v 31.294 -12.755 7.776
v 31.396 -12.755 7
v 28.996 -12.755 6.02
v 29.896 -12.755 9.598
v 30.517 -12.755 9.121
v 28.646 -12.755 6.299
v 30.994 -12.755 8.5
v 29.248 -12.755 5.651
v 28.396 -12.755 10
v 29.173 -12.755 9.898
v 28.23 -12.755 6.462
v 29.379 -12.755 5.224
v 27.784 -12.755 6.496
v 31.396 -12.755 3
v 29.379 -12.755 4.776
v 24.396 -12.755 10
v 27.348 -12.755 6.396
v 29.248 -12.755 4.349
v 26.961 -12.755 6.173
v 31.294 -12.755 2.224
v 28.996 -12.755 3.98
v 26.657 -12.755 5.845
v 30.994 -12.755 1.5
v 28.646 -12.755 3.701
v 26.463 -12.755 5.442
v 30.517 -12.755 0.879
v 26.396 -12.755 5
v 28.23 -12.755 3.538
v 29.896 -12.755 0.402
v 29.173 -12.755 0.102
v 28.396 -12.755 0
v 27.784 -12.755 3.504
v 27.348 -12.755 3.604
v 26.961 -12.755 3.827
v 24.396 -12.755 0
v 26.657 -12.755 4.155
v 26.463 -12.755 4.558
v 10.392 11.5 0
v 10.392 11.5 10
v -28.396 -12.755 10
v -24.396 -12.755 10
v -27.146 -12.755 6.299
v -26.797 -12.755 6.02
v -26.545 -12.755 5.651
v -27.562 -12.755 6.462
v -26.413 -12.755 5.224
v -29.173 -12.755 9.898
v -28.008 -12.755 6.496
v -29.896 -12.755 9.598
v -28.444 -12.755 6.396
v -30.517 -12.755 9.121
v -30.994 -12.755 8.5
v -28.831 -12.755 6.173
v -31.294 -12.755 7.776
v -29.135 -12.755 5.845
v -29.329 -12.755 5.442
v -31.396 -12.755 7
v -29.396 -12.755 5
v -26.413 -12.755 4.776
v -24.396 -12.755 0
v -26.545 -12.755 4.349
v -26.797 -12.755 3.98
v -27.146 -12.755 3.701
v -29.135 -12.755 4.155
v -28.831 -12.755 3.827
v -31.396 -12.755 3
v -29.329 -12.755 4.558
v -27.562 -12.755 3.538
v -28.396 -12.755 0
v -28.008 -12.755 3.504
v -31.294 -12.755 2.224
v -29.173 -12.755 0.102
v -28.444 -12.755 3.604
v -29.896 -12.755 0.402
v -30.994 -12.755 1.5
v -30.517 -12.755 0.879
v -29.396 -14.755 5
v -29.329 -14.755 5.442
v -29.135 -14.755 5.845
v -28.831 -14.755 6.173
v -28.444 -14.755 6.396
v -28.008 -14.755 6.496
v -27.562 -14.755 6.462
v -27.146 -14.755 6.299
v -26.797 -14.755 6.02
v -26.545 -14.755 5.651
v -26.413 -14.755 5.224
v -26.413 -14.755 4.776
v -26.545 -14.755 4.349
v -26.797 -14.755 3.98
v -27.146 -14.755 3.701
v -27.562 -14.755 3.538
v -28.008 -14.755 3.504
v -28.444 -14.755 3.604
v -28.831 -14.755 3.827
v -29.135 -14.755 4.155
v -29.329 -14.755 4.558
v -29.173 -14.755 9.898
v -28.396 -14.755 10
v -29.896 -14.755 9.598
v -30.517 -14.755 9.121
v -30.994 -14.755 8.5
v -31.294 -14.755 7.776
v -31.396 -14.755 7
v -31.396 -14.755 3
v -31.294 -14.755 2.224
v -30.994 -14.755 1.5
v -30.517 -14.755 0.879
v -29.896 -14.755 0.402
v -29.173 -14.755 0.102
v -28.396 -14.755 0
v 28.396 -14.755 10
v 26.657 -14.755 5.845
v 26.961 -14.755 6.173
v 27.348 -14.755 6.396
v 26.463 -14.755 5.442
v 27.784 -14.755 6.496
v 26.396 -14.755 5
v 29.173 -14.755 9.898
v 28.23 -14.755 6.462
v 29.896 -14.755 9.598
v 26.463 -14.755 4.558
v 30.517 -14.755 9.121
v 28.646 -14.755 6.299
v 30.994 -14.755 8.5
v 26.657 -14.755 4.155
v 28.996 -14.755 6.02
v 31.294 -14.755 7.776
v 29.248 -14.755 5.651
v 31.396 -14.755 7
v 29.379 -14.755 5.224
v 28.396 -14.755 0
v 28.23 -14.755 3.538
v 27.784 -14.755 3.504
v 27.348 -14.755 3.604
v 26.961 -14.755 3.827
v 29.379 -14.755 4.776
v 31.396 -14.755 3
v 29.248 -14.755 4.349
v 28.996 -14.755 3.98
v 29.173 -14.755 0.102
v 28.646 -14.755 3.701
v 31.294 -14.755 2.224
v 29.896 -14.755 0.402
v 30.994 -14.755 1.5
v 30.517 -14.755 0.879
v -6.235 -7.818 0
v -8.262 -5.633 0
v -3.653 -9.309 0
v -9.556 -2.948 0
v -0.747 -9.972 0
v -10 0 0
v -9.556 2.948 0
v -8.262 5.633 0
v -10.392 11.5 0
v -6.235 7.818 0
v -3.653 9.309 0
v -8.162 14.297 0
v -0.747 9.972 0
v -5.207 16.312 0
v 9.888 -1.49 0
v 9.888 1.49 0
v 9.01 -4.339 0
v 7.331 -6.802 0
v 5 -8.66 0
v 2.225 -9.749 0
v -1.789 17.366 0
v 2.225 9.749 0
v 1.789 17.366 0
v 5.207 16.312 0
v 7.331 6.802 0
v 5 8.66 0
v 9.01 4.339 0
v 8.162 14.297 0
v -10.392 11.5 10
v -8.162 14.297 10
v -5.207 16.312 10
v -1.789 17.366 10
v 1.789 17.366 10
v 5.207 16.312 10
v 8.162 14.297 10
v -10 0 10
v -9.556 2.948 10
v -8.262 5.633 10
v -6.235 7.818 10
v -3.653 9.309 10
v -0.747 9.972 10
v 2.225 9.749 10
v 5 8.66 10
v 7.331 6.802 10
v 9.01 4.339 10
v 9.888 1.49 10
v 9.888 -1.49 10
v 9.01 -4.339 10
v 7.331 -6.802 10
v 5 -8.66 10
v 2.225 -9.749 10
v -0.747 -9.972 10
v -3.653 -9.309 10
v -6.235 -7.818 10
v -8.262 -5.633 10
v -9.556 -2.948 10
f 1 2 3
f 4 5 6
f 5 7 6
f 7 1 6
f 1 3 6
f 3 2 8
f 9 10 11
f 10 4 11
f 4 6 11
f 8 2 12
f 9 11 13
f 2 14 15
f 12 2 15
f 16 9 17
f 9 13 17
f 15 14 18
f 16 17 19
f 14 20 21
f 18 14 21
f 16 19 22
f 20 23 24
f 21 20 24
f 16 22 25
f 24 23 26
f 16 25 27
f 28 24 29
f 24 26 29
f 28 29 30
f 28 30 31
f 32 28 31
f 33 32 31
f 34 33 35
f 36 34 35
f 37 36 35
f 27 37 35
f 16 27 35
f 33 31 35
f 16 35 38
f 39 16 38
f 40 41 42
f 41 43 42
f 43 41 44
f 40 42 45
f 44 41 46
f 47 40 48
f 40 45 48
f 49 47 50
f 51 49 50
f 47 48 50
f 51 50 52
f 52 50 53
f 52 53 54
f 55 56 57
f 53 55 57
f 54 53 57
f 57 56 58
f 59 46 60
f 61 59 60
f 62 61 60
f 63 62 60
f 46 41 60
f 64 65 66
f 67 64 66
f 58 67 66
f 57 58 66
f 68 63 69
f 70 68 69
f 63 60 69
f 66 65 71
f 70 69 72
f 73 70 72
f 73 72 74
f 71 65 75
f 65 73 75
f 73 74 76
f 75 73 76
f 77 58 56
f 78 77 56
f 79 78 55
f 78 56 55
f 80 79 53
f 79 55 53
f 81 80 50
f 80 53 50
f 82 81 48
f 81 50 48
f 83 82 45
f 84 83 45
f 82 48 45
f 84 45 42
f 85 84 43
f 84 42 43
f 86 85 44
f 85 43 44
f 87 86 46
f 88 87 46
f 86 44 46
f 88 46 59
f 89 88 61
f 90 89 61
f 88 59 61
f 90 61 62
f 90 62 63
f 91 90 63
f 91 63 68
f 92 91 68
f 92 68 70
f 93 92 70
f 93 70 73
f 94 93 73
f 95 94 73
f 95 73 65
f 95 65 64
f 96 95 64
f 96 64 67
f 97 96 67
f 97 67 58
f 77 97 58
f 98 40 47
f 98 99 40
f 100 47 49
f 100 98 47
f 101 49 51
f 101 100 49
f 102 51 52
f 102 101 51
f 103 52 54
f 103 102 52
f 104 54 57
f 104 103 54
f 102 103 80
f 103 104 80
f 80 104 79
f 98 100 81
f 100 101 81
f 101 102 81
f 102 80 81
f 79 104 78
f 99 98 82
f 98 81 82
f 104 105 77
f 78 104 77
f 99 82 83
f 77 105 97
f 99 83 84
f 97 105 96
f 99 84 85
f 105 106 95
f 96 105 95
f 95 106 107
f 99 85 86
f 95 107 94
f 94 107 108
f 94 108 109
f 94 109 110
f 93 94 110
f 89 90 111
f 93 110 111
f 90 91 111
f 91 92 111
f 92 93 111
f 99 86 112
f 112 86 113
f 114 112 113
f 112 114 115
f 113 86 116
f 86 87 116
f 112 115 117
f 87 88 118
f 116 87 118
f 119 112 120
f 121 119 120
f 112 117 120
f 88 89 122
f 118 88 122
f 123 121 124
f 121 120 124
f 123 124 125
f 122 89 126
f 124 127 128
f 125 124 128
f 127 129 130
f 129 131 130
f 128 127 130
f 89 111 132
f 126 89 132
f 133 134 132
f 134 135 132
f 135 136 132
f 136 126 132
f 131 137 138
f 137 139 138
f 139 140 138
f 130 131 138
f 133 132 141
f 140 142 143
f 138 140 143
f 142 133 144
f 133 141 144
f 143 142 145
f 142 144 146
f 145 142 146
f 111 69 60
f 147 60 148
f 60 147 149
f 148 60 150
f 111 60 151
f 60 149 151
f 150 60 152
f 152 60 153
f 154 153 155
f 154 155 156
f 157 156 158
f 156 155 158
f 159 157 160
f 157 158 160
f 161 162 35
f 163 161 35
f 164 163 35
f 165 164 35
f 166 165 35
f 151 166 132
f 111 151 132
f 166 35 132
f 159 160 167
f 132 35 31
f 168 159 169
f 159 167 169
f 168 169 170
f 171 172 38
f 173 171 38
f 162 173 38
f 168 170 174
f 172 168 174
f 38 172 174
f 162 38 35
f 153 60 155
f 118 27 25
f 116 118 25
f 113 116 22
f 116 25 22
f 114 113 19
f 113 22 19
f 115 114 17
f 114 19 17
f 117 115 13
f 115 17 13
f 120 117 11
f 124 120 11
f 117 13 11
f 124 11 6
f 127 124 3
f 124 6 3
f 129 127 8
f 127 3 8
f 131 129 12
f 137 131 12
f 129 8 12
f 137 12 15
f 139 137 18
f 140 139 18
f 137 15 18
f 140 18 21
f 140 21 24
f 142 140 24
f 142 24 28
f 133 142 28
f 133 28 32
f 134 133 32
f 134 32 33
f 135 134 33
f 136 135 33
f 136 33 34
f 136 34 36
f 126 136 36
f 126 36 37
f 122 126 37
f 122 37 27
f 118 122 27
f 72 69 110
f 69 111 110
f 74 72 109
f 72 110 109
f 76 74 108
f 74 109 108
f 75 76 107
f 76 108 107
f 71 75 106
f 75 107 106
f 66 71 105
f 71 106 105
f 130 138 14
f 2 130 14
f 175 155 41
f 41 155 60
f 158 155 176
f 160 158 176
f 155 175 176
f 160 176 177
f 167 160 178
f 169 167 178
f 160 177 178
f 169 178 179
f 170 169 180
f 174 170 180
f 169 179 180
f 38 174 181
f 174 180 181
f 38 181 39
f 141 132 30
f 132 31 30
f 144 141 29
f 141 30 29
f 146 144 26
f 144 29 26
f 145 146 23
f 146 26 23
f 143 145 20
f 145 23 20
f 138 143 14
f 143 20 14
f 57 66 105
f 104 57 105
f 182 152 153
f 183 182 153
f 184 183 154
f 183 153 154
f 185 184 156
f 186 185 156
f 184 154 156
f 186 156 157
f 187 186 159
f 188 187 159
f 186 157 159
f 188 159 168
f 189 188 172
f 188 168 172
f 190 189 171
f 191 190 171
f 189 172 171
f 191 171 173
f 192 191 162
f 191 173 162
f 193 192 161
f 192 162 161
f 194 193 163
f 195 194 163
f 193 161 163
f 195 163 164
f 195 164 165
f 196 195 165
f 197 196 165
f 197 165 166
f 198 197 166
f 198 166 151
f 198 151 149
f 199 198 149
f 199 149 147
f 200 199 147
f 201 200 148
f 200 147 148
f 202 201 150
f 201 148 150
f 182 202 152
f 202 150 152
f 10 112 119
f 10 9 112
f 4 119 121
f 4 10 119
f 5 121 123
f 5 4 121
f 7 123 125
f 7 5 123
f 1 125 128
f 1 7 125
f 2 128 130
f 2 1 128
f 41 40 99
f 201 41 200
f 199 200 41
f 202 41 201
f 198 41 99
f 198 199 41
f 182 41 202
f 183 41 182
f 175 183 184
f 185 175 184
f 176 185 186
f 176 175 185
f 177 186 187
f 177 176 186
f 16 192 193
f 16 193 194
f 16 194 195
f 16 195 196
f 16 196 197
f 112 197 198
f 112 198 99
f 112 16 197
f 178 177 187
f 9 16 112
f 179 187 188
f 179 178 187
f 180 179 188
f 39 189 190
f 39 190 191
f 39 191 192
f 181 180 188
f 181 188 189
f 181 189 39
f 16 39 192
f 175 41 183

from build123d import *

# Parameters (mm, degrees)
SALIENTE_EXTRUIR3_DEPTH = 10
CROQUIS3_R              = 10
CORTAR_EXTRUIR1_DEPTH   = 10
REDONDEO2_R             = 12
CROQUIS4_R              = 1.5
CORTAR_EXTRUIR2_DEPTH   = 45.733638102
REDONDEO3_R             = 3


with BuildPart() as part:
    # Croquis1 → Saliente-Extruir3 (new body)
    with BuildSketch(Plane.XY):
        Polygon((0, 29.5), (-24.396106146, -12.755295351), (-31.396106146, -12.755295351), (-31.396106146, -14.755295351), (-25.556921229, -14.755295351), (25.556921229, -14.755295351), (31.396106146, -14.755295351), (31.396106146, -12.755295351), (24.396106146, -12.755295351), align=None)
    extrude(amount=SALIENTE_EXTRUIR3_DEPTH)

    # Croquis3 → Cortar-Extruir1 (cut)
    with BuildSketch(Plane(origin=(0, 0, 0), x_dir=(-1, 0, 0), z_dir=(0, 0, -1))):
        Circle(CROQUIS3_R)
    extrude(amount=-CORTAR_EXTRUIR1_DEPTH, mode=Mode.SUBTRACT)

    # Redondeo2
    redondeo2_edges = [part.edges().sort_by_distance(p)[0] for p in [
        (0, 29.5, 5),
    ]]
    fillet(redondeo2_edges, radius=REDONDEO2_R)

    # Croquis4 → Cortar-Extruir2 (cut, through all)
    with BuildSketch(Plane(origin=(0, -12.755295351, 0), x_dir=(1, 0, 0), z_dir=(0, 1, 0))):
        with Locations(Location((27.896106146, -5, 0), (0, 0, 180))):
            Circle(CROQUIS4_R)
        with Locations(Location((-27.896106146, -5, 0), (0, 0, 180))):
            Circle(CROQUIS4_R)
    extrude(amount=-CORTAR_EXTRUIR2_DEPTH, mode=Mode.SUBTRACT)

    # Redondeo3
    redondeo3_edges = [part.edges().sort_by_distance(p)[0] for p in [
        (-31.396106146, -13.755295351, 10),
        (-31.396106146, -13.755295351, 0),
        (31.396106146, -13.755295351, 10),
        (31.396106146, -13.755295351, 0),
    ]]
    fillet(redondeo3_edges, radius=REDONDEO3_R)


solid = part.part
